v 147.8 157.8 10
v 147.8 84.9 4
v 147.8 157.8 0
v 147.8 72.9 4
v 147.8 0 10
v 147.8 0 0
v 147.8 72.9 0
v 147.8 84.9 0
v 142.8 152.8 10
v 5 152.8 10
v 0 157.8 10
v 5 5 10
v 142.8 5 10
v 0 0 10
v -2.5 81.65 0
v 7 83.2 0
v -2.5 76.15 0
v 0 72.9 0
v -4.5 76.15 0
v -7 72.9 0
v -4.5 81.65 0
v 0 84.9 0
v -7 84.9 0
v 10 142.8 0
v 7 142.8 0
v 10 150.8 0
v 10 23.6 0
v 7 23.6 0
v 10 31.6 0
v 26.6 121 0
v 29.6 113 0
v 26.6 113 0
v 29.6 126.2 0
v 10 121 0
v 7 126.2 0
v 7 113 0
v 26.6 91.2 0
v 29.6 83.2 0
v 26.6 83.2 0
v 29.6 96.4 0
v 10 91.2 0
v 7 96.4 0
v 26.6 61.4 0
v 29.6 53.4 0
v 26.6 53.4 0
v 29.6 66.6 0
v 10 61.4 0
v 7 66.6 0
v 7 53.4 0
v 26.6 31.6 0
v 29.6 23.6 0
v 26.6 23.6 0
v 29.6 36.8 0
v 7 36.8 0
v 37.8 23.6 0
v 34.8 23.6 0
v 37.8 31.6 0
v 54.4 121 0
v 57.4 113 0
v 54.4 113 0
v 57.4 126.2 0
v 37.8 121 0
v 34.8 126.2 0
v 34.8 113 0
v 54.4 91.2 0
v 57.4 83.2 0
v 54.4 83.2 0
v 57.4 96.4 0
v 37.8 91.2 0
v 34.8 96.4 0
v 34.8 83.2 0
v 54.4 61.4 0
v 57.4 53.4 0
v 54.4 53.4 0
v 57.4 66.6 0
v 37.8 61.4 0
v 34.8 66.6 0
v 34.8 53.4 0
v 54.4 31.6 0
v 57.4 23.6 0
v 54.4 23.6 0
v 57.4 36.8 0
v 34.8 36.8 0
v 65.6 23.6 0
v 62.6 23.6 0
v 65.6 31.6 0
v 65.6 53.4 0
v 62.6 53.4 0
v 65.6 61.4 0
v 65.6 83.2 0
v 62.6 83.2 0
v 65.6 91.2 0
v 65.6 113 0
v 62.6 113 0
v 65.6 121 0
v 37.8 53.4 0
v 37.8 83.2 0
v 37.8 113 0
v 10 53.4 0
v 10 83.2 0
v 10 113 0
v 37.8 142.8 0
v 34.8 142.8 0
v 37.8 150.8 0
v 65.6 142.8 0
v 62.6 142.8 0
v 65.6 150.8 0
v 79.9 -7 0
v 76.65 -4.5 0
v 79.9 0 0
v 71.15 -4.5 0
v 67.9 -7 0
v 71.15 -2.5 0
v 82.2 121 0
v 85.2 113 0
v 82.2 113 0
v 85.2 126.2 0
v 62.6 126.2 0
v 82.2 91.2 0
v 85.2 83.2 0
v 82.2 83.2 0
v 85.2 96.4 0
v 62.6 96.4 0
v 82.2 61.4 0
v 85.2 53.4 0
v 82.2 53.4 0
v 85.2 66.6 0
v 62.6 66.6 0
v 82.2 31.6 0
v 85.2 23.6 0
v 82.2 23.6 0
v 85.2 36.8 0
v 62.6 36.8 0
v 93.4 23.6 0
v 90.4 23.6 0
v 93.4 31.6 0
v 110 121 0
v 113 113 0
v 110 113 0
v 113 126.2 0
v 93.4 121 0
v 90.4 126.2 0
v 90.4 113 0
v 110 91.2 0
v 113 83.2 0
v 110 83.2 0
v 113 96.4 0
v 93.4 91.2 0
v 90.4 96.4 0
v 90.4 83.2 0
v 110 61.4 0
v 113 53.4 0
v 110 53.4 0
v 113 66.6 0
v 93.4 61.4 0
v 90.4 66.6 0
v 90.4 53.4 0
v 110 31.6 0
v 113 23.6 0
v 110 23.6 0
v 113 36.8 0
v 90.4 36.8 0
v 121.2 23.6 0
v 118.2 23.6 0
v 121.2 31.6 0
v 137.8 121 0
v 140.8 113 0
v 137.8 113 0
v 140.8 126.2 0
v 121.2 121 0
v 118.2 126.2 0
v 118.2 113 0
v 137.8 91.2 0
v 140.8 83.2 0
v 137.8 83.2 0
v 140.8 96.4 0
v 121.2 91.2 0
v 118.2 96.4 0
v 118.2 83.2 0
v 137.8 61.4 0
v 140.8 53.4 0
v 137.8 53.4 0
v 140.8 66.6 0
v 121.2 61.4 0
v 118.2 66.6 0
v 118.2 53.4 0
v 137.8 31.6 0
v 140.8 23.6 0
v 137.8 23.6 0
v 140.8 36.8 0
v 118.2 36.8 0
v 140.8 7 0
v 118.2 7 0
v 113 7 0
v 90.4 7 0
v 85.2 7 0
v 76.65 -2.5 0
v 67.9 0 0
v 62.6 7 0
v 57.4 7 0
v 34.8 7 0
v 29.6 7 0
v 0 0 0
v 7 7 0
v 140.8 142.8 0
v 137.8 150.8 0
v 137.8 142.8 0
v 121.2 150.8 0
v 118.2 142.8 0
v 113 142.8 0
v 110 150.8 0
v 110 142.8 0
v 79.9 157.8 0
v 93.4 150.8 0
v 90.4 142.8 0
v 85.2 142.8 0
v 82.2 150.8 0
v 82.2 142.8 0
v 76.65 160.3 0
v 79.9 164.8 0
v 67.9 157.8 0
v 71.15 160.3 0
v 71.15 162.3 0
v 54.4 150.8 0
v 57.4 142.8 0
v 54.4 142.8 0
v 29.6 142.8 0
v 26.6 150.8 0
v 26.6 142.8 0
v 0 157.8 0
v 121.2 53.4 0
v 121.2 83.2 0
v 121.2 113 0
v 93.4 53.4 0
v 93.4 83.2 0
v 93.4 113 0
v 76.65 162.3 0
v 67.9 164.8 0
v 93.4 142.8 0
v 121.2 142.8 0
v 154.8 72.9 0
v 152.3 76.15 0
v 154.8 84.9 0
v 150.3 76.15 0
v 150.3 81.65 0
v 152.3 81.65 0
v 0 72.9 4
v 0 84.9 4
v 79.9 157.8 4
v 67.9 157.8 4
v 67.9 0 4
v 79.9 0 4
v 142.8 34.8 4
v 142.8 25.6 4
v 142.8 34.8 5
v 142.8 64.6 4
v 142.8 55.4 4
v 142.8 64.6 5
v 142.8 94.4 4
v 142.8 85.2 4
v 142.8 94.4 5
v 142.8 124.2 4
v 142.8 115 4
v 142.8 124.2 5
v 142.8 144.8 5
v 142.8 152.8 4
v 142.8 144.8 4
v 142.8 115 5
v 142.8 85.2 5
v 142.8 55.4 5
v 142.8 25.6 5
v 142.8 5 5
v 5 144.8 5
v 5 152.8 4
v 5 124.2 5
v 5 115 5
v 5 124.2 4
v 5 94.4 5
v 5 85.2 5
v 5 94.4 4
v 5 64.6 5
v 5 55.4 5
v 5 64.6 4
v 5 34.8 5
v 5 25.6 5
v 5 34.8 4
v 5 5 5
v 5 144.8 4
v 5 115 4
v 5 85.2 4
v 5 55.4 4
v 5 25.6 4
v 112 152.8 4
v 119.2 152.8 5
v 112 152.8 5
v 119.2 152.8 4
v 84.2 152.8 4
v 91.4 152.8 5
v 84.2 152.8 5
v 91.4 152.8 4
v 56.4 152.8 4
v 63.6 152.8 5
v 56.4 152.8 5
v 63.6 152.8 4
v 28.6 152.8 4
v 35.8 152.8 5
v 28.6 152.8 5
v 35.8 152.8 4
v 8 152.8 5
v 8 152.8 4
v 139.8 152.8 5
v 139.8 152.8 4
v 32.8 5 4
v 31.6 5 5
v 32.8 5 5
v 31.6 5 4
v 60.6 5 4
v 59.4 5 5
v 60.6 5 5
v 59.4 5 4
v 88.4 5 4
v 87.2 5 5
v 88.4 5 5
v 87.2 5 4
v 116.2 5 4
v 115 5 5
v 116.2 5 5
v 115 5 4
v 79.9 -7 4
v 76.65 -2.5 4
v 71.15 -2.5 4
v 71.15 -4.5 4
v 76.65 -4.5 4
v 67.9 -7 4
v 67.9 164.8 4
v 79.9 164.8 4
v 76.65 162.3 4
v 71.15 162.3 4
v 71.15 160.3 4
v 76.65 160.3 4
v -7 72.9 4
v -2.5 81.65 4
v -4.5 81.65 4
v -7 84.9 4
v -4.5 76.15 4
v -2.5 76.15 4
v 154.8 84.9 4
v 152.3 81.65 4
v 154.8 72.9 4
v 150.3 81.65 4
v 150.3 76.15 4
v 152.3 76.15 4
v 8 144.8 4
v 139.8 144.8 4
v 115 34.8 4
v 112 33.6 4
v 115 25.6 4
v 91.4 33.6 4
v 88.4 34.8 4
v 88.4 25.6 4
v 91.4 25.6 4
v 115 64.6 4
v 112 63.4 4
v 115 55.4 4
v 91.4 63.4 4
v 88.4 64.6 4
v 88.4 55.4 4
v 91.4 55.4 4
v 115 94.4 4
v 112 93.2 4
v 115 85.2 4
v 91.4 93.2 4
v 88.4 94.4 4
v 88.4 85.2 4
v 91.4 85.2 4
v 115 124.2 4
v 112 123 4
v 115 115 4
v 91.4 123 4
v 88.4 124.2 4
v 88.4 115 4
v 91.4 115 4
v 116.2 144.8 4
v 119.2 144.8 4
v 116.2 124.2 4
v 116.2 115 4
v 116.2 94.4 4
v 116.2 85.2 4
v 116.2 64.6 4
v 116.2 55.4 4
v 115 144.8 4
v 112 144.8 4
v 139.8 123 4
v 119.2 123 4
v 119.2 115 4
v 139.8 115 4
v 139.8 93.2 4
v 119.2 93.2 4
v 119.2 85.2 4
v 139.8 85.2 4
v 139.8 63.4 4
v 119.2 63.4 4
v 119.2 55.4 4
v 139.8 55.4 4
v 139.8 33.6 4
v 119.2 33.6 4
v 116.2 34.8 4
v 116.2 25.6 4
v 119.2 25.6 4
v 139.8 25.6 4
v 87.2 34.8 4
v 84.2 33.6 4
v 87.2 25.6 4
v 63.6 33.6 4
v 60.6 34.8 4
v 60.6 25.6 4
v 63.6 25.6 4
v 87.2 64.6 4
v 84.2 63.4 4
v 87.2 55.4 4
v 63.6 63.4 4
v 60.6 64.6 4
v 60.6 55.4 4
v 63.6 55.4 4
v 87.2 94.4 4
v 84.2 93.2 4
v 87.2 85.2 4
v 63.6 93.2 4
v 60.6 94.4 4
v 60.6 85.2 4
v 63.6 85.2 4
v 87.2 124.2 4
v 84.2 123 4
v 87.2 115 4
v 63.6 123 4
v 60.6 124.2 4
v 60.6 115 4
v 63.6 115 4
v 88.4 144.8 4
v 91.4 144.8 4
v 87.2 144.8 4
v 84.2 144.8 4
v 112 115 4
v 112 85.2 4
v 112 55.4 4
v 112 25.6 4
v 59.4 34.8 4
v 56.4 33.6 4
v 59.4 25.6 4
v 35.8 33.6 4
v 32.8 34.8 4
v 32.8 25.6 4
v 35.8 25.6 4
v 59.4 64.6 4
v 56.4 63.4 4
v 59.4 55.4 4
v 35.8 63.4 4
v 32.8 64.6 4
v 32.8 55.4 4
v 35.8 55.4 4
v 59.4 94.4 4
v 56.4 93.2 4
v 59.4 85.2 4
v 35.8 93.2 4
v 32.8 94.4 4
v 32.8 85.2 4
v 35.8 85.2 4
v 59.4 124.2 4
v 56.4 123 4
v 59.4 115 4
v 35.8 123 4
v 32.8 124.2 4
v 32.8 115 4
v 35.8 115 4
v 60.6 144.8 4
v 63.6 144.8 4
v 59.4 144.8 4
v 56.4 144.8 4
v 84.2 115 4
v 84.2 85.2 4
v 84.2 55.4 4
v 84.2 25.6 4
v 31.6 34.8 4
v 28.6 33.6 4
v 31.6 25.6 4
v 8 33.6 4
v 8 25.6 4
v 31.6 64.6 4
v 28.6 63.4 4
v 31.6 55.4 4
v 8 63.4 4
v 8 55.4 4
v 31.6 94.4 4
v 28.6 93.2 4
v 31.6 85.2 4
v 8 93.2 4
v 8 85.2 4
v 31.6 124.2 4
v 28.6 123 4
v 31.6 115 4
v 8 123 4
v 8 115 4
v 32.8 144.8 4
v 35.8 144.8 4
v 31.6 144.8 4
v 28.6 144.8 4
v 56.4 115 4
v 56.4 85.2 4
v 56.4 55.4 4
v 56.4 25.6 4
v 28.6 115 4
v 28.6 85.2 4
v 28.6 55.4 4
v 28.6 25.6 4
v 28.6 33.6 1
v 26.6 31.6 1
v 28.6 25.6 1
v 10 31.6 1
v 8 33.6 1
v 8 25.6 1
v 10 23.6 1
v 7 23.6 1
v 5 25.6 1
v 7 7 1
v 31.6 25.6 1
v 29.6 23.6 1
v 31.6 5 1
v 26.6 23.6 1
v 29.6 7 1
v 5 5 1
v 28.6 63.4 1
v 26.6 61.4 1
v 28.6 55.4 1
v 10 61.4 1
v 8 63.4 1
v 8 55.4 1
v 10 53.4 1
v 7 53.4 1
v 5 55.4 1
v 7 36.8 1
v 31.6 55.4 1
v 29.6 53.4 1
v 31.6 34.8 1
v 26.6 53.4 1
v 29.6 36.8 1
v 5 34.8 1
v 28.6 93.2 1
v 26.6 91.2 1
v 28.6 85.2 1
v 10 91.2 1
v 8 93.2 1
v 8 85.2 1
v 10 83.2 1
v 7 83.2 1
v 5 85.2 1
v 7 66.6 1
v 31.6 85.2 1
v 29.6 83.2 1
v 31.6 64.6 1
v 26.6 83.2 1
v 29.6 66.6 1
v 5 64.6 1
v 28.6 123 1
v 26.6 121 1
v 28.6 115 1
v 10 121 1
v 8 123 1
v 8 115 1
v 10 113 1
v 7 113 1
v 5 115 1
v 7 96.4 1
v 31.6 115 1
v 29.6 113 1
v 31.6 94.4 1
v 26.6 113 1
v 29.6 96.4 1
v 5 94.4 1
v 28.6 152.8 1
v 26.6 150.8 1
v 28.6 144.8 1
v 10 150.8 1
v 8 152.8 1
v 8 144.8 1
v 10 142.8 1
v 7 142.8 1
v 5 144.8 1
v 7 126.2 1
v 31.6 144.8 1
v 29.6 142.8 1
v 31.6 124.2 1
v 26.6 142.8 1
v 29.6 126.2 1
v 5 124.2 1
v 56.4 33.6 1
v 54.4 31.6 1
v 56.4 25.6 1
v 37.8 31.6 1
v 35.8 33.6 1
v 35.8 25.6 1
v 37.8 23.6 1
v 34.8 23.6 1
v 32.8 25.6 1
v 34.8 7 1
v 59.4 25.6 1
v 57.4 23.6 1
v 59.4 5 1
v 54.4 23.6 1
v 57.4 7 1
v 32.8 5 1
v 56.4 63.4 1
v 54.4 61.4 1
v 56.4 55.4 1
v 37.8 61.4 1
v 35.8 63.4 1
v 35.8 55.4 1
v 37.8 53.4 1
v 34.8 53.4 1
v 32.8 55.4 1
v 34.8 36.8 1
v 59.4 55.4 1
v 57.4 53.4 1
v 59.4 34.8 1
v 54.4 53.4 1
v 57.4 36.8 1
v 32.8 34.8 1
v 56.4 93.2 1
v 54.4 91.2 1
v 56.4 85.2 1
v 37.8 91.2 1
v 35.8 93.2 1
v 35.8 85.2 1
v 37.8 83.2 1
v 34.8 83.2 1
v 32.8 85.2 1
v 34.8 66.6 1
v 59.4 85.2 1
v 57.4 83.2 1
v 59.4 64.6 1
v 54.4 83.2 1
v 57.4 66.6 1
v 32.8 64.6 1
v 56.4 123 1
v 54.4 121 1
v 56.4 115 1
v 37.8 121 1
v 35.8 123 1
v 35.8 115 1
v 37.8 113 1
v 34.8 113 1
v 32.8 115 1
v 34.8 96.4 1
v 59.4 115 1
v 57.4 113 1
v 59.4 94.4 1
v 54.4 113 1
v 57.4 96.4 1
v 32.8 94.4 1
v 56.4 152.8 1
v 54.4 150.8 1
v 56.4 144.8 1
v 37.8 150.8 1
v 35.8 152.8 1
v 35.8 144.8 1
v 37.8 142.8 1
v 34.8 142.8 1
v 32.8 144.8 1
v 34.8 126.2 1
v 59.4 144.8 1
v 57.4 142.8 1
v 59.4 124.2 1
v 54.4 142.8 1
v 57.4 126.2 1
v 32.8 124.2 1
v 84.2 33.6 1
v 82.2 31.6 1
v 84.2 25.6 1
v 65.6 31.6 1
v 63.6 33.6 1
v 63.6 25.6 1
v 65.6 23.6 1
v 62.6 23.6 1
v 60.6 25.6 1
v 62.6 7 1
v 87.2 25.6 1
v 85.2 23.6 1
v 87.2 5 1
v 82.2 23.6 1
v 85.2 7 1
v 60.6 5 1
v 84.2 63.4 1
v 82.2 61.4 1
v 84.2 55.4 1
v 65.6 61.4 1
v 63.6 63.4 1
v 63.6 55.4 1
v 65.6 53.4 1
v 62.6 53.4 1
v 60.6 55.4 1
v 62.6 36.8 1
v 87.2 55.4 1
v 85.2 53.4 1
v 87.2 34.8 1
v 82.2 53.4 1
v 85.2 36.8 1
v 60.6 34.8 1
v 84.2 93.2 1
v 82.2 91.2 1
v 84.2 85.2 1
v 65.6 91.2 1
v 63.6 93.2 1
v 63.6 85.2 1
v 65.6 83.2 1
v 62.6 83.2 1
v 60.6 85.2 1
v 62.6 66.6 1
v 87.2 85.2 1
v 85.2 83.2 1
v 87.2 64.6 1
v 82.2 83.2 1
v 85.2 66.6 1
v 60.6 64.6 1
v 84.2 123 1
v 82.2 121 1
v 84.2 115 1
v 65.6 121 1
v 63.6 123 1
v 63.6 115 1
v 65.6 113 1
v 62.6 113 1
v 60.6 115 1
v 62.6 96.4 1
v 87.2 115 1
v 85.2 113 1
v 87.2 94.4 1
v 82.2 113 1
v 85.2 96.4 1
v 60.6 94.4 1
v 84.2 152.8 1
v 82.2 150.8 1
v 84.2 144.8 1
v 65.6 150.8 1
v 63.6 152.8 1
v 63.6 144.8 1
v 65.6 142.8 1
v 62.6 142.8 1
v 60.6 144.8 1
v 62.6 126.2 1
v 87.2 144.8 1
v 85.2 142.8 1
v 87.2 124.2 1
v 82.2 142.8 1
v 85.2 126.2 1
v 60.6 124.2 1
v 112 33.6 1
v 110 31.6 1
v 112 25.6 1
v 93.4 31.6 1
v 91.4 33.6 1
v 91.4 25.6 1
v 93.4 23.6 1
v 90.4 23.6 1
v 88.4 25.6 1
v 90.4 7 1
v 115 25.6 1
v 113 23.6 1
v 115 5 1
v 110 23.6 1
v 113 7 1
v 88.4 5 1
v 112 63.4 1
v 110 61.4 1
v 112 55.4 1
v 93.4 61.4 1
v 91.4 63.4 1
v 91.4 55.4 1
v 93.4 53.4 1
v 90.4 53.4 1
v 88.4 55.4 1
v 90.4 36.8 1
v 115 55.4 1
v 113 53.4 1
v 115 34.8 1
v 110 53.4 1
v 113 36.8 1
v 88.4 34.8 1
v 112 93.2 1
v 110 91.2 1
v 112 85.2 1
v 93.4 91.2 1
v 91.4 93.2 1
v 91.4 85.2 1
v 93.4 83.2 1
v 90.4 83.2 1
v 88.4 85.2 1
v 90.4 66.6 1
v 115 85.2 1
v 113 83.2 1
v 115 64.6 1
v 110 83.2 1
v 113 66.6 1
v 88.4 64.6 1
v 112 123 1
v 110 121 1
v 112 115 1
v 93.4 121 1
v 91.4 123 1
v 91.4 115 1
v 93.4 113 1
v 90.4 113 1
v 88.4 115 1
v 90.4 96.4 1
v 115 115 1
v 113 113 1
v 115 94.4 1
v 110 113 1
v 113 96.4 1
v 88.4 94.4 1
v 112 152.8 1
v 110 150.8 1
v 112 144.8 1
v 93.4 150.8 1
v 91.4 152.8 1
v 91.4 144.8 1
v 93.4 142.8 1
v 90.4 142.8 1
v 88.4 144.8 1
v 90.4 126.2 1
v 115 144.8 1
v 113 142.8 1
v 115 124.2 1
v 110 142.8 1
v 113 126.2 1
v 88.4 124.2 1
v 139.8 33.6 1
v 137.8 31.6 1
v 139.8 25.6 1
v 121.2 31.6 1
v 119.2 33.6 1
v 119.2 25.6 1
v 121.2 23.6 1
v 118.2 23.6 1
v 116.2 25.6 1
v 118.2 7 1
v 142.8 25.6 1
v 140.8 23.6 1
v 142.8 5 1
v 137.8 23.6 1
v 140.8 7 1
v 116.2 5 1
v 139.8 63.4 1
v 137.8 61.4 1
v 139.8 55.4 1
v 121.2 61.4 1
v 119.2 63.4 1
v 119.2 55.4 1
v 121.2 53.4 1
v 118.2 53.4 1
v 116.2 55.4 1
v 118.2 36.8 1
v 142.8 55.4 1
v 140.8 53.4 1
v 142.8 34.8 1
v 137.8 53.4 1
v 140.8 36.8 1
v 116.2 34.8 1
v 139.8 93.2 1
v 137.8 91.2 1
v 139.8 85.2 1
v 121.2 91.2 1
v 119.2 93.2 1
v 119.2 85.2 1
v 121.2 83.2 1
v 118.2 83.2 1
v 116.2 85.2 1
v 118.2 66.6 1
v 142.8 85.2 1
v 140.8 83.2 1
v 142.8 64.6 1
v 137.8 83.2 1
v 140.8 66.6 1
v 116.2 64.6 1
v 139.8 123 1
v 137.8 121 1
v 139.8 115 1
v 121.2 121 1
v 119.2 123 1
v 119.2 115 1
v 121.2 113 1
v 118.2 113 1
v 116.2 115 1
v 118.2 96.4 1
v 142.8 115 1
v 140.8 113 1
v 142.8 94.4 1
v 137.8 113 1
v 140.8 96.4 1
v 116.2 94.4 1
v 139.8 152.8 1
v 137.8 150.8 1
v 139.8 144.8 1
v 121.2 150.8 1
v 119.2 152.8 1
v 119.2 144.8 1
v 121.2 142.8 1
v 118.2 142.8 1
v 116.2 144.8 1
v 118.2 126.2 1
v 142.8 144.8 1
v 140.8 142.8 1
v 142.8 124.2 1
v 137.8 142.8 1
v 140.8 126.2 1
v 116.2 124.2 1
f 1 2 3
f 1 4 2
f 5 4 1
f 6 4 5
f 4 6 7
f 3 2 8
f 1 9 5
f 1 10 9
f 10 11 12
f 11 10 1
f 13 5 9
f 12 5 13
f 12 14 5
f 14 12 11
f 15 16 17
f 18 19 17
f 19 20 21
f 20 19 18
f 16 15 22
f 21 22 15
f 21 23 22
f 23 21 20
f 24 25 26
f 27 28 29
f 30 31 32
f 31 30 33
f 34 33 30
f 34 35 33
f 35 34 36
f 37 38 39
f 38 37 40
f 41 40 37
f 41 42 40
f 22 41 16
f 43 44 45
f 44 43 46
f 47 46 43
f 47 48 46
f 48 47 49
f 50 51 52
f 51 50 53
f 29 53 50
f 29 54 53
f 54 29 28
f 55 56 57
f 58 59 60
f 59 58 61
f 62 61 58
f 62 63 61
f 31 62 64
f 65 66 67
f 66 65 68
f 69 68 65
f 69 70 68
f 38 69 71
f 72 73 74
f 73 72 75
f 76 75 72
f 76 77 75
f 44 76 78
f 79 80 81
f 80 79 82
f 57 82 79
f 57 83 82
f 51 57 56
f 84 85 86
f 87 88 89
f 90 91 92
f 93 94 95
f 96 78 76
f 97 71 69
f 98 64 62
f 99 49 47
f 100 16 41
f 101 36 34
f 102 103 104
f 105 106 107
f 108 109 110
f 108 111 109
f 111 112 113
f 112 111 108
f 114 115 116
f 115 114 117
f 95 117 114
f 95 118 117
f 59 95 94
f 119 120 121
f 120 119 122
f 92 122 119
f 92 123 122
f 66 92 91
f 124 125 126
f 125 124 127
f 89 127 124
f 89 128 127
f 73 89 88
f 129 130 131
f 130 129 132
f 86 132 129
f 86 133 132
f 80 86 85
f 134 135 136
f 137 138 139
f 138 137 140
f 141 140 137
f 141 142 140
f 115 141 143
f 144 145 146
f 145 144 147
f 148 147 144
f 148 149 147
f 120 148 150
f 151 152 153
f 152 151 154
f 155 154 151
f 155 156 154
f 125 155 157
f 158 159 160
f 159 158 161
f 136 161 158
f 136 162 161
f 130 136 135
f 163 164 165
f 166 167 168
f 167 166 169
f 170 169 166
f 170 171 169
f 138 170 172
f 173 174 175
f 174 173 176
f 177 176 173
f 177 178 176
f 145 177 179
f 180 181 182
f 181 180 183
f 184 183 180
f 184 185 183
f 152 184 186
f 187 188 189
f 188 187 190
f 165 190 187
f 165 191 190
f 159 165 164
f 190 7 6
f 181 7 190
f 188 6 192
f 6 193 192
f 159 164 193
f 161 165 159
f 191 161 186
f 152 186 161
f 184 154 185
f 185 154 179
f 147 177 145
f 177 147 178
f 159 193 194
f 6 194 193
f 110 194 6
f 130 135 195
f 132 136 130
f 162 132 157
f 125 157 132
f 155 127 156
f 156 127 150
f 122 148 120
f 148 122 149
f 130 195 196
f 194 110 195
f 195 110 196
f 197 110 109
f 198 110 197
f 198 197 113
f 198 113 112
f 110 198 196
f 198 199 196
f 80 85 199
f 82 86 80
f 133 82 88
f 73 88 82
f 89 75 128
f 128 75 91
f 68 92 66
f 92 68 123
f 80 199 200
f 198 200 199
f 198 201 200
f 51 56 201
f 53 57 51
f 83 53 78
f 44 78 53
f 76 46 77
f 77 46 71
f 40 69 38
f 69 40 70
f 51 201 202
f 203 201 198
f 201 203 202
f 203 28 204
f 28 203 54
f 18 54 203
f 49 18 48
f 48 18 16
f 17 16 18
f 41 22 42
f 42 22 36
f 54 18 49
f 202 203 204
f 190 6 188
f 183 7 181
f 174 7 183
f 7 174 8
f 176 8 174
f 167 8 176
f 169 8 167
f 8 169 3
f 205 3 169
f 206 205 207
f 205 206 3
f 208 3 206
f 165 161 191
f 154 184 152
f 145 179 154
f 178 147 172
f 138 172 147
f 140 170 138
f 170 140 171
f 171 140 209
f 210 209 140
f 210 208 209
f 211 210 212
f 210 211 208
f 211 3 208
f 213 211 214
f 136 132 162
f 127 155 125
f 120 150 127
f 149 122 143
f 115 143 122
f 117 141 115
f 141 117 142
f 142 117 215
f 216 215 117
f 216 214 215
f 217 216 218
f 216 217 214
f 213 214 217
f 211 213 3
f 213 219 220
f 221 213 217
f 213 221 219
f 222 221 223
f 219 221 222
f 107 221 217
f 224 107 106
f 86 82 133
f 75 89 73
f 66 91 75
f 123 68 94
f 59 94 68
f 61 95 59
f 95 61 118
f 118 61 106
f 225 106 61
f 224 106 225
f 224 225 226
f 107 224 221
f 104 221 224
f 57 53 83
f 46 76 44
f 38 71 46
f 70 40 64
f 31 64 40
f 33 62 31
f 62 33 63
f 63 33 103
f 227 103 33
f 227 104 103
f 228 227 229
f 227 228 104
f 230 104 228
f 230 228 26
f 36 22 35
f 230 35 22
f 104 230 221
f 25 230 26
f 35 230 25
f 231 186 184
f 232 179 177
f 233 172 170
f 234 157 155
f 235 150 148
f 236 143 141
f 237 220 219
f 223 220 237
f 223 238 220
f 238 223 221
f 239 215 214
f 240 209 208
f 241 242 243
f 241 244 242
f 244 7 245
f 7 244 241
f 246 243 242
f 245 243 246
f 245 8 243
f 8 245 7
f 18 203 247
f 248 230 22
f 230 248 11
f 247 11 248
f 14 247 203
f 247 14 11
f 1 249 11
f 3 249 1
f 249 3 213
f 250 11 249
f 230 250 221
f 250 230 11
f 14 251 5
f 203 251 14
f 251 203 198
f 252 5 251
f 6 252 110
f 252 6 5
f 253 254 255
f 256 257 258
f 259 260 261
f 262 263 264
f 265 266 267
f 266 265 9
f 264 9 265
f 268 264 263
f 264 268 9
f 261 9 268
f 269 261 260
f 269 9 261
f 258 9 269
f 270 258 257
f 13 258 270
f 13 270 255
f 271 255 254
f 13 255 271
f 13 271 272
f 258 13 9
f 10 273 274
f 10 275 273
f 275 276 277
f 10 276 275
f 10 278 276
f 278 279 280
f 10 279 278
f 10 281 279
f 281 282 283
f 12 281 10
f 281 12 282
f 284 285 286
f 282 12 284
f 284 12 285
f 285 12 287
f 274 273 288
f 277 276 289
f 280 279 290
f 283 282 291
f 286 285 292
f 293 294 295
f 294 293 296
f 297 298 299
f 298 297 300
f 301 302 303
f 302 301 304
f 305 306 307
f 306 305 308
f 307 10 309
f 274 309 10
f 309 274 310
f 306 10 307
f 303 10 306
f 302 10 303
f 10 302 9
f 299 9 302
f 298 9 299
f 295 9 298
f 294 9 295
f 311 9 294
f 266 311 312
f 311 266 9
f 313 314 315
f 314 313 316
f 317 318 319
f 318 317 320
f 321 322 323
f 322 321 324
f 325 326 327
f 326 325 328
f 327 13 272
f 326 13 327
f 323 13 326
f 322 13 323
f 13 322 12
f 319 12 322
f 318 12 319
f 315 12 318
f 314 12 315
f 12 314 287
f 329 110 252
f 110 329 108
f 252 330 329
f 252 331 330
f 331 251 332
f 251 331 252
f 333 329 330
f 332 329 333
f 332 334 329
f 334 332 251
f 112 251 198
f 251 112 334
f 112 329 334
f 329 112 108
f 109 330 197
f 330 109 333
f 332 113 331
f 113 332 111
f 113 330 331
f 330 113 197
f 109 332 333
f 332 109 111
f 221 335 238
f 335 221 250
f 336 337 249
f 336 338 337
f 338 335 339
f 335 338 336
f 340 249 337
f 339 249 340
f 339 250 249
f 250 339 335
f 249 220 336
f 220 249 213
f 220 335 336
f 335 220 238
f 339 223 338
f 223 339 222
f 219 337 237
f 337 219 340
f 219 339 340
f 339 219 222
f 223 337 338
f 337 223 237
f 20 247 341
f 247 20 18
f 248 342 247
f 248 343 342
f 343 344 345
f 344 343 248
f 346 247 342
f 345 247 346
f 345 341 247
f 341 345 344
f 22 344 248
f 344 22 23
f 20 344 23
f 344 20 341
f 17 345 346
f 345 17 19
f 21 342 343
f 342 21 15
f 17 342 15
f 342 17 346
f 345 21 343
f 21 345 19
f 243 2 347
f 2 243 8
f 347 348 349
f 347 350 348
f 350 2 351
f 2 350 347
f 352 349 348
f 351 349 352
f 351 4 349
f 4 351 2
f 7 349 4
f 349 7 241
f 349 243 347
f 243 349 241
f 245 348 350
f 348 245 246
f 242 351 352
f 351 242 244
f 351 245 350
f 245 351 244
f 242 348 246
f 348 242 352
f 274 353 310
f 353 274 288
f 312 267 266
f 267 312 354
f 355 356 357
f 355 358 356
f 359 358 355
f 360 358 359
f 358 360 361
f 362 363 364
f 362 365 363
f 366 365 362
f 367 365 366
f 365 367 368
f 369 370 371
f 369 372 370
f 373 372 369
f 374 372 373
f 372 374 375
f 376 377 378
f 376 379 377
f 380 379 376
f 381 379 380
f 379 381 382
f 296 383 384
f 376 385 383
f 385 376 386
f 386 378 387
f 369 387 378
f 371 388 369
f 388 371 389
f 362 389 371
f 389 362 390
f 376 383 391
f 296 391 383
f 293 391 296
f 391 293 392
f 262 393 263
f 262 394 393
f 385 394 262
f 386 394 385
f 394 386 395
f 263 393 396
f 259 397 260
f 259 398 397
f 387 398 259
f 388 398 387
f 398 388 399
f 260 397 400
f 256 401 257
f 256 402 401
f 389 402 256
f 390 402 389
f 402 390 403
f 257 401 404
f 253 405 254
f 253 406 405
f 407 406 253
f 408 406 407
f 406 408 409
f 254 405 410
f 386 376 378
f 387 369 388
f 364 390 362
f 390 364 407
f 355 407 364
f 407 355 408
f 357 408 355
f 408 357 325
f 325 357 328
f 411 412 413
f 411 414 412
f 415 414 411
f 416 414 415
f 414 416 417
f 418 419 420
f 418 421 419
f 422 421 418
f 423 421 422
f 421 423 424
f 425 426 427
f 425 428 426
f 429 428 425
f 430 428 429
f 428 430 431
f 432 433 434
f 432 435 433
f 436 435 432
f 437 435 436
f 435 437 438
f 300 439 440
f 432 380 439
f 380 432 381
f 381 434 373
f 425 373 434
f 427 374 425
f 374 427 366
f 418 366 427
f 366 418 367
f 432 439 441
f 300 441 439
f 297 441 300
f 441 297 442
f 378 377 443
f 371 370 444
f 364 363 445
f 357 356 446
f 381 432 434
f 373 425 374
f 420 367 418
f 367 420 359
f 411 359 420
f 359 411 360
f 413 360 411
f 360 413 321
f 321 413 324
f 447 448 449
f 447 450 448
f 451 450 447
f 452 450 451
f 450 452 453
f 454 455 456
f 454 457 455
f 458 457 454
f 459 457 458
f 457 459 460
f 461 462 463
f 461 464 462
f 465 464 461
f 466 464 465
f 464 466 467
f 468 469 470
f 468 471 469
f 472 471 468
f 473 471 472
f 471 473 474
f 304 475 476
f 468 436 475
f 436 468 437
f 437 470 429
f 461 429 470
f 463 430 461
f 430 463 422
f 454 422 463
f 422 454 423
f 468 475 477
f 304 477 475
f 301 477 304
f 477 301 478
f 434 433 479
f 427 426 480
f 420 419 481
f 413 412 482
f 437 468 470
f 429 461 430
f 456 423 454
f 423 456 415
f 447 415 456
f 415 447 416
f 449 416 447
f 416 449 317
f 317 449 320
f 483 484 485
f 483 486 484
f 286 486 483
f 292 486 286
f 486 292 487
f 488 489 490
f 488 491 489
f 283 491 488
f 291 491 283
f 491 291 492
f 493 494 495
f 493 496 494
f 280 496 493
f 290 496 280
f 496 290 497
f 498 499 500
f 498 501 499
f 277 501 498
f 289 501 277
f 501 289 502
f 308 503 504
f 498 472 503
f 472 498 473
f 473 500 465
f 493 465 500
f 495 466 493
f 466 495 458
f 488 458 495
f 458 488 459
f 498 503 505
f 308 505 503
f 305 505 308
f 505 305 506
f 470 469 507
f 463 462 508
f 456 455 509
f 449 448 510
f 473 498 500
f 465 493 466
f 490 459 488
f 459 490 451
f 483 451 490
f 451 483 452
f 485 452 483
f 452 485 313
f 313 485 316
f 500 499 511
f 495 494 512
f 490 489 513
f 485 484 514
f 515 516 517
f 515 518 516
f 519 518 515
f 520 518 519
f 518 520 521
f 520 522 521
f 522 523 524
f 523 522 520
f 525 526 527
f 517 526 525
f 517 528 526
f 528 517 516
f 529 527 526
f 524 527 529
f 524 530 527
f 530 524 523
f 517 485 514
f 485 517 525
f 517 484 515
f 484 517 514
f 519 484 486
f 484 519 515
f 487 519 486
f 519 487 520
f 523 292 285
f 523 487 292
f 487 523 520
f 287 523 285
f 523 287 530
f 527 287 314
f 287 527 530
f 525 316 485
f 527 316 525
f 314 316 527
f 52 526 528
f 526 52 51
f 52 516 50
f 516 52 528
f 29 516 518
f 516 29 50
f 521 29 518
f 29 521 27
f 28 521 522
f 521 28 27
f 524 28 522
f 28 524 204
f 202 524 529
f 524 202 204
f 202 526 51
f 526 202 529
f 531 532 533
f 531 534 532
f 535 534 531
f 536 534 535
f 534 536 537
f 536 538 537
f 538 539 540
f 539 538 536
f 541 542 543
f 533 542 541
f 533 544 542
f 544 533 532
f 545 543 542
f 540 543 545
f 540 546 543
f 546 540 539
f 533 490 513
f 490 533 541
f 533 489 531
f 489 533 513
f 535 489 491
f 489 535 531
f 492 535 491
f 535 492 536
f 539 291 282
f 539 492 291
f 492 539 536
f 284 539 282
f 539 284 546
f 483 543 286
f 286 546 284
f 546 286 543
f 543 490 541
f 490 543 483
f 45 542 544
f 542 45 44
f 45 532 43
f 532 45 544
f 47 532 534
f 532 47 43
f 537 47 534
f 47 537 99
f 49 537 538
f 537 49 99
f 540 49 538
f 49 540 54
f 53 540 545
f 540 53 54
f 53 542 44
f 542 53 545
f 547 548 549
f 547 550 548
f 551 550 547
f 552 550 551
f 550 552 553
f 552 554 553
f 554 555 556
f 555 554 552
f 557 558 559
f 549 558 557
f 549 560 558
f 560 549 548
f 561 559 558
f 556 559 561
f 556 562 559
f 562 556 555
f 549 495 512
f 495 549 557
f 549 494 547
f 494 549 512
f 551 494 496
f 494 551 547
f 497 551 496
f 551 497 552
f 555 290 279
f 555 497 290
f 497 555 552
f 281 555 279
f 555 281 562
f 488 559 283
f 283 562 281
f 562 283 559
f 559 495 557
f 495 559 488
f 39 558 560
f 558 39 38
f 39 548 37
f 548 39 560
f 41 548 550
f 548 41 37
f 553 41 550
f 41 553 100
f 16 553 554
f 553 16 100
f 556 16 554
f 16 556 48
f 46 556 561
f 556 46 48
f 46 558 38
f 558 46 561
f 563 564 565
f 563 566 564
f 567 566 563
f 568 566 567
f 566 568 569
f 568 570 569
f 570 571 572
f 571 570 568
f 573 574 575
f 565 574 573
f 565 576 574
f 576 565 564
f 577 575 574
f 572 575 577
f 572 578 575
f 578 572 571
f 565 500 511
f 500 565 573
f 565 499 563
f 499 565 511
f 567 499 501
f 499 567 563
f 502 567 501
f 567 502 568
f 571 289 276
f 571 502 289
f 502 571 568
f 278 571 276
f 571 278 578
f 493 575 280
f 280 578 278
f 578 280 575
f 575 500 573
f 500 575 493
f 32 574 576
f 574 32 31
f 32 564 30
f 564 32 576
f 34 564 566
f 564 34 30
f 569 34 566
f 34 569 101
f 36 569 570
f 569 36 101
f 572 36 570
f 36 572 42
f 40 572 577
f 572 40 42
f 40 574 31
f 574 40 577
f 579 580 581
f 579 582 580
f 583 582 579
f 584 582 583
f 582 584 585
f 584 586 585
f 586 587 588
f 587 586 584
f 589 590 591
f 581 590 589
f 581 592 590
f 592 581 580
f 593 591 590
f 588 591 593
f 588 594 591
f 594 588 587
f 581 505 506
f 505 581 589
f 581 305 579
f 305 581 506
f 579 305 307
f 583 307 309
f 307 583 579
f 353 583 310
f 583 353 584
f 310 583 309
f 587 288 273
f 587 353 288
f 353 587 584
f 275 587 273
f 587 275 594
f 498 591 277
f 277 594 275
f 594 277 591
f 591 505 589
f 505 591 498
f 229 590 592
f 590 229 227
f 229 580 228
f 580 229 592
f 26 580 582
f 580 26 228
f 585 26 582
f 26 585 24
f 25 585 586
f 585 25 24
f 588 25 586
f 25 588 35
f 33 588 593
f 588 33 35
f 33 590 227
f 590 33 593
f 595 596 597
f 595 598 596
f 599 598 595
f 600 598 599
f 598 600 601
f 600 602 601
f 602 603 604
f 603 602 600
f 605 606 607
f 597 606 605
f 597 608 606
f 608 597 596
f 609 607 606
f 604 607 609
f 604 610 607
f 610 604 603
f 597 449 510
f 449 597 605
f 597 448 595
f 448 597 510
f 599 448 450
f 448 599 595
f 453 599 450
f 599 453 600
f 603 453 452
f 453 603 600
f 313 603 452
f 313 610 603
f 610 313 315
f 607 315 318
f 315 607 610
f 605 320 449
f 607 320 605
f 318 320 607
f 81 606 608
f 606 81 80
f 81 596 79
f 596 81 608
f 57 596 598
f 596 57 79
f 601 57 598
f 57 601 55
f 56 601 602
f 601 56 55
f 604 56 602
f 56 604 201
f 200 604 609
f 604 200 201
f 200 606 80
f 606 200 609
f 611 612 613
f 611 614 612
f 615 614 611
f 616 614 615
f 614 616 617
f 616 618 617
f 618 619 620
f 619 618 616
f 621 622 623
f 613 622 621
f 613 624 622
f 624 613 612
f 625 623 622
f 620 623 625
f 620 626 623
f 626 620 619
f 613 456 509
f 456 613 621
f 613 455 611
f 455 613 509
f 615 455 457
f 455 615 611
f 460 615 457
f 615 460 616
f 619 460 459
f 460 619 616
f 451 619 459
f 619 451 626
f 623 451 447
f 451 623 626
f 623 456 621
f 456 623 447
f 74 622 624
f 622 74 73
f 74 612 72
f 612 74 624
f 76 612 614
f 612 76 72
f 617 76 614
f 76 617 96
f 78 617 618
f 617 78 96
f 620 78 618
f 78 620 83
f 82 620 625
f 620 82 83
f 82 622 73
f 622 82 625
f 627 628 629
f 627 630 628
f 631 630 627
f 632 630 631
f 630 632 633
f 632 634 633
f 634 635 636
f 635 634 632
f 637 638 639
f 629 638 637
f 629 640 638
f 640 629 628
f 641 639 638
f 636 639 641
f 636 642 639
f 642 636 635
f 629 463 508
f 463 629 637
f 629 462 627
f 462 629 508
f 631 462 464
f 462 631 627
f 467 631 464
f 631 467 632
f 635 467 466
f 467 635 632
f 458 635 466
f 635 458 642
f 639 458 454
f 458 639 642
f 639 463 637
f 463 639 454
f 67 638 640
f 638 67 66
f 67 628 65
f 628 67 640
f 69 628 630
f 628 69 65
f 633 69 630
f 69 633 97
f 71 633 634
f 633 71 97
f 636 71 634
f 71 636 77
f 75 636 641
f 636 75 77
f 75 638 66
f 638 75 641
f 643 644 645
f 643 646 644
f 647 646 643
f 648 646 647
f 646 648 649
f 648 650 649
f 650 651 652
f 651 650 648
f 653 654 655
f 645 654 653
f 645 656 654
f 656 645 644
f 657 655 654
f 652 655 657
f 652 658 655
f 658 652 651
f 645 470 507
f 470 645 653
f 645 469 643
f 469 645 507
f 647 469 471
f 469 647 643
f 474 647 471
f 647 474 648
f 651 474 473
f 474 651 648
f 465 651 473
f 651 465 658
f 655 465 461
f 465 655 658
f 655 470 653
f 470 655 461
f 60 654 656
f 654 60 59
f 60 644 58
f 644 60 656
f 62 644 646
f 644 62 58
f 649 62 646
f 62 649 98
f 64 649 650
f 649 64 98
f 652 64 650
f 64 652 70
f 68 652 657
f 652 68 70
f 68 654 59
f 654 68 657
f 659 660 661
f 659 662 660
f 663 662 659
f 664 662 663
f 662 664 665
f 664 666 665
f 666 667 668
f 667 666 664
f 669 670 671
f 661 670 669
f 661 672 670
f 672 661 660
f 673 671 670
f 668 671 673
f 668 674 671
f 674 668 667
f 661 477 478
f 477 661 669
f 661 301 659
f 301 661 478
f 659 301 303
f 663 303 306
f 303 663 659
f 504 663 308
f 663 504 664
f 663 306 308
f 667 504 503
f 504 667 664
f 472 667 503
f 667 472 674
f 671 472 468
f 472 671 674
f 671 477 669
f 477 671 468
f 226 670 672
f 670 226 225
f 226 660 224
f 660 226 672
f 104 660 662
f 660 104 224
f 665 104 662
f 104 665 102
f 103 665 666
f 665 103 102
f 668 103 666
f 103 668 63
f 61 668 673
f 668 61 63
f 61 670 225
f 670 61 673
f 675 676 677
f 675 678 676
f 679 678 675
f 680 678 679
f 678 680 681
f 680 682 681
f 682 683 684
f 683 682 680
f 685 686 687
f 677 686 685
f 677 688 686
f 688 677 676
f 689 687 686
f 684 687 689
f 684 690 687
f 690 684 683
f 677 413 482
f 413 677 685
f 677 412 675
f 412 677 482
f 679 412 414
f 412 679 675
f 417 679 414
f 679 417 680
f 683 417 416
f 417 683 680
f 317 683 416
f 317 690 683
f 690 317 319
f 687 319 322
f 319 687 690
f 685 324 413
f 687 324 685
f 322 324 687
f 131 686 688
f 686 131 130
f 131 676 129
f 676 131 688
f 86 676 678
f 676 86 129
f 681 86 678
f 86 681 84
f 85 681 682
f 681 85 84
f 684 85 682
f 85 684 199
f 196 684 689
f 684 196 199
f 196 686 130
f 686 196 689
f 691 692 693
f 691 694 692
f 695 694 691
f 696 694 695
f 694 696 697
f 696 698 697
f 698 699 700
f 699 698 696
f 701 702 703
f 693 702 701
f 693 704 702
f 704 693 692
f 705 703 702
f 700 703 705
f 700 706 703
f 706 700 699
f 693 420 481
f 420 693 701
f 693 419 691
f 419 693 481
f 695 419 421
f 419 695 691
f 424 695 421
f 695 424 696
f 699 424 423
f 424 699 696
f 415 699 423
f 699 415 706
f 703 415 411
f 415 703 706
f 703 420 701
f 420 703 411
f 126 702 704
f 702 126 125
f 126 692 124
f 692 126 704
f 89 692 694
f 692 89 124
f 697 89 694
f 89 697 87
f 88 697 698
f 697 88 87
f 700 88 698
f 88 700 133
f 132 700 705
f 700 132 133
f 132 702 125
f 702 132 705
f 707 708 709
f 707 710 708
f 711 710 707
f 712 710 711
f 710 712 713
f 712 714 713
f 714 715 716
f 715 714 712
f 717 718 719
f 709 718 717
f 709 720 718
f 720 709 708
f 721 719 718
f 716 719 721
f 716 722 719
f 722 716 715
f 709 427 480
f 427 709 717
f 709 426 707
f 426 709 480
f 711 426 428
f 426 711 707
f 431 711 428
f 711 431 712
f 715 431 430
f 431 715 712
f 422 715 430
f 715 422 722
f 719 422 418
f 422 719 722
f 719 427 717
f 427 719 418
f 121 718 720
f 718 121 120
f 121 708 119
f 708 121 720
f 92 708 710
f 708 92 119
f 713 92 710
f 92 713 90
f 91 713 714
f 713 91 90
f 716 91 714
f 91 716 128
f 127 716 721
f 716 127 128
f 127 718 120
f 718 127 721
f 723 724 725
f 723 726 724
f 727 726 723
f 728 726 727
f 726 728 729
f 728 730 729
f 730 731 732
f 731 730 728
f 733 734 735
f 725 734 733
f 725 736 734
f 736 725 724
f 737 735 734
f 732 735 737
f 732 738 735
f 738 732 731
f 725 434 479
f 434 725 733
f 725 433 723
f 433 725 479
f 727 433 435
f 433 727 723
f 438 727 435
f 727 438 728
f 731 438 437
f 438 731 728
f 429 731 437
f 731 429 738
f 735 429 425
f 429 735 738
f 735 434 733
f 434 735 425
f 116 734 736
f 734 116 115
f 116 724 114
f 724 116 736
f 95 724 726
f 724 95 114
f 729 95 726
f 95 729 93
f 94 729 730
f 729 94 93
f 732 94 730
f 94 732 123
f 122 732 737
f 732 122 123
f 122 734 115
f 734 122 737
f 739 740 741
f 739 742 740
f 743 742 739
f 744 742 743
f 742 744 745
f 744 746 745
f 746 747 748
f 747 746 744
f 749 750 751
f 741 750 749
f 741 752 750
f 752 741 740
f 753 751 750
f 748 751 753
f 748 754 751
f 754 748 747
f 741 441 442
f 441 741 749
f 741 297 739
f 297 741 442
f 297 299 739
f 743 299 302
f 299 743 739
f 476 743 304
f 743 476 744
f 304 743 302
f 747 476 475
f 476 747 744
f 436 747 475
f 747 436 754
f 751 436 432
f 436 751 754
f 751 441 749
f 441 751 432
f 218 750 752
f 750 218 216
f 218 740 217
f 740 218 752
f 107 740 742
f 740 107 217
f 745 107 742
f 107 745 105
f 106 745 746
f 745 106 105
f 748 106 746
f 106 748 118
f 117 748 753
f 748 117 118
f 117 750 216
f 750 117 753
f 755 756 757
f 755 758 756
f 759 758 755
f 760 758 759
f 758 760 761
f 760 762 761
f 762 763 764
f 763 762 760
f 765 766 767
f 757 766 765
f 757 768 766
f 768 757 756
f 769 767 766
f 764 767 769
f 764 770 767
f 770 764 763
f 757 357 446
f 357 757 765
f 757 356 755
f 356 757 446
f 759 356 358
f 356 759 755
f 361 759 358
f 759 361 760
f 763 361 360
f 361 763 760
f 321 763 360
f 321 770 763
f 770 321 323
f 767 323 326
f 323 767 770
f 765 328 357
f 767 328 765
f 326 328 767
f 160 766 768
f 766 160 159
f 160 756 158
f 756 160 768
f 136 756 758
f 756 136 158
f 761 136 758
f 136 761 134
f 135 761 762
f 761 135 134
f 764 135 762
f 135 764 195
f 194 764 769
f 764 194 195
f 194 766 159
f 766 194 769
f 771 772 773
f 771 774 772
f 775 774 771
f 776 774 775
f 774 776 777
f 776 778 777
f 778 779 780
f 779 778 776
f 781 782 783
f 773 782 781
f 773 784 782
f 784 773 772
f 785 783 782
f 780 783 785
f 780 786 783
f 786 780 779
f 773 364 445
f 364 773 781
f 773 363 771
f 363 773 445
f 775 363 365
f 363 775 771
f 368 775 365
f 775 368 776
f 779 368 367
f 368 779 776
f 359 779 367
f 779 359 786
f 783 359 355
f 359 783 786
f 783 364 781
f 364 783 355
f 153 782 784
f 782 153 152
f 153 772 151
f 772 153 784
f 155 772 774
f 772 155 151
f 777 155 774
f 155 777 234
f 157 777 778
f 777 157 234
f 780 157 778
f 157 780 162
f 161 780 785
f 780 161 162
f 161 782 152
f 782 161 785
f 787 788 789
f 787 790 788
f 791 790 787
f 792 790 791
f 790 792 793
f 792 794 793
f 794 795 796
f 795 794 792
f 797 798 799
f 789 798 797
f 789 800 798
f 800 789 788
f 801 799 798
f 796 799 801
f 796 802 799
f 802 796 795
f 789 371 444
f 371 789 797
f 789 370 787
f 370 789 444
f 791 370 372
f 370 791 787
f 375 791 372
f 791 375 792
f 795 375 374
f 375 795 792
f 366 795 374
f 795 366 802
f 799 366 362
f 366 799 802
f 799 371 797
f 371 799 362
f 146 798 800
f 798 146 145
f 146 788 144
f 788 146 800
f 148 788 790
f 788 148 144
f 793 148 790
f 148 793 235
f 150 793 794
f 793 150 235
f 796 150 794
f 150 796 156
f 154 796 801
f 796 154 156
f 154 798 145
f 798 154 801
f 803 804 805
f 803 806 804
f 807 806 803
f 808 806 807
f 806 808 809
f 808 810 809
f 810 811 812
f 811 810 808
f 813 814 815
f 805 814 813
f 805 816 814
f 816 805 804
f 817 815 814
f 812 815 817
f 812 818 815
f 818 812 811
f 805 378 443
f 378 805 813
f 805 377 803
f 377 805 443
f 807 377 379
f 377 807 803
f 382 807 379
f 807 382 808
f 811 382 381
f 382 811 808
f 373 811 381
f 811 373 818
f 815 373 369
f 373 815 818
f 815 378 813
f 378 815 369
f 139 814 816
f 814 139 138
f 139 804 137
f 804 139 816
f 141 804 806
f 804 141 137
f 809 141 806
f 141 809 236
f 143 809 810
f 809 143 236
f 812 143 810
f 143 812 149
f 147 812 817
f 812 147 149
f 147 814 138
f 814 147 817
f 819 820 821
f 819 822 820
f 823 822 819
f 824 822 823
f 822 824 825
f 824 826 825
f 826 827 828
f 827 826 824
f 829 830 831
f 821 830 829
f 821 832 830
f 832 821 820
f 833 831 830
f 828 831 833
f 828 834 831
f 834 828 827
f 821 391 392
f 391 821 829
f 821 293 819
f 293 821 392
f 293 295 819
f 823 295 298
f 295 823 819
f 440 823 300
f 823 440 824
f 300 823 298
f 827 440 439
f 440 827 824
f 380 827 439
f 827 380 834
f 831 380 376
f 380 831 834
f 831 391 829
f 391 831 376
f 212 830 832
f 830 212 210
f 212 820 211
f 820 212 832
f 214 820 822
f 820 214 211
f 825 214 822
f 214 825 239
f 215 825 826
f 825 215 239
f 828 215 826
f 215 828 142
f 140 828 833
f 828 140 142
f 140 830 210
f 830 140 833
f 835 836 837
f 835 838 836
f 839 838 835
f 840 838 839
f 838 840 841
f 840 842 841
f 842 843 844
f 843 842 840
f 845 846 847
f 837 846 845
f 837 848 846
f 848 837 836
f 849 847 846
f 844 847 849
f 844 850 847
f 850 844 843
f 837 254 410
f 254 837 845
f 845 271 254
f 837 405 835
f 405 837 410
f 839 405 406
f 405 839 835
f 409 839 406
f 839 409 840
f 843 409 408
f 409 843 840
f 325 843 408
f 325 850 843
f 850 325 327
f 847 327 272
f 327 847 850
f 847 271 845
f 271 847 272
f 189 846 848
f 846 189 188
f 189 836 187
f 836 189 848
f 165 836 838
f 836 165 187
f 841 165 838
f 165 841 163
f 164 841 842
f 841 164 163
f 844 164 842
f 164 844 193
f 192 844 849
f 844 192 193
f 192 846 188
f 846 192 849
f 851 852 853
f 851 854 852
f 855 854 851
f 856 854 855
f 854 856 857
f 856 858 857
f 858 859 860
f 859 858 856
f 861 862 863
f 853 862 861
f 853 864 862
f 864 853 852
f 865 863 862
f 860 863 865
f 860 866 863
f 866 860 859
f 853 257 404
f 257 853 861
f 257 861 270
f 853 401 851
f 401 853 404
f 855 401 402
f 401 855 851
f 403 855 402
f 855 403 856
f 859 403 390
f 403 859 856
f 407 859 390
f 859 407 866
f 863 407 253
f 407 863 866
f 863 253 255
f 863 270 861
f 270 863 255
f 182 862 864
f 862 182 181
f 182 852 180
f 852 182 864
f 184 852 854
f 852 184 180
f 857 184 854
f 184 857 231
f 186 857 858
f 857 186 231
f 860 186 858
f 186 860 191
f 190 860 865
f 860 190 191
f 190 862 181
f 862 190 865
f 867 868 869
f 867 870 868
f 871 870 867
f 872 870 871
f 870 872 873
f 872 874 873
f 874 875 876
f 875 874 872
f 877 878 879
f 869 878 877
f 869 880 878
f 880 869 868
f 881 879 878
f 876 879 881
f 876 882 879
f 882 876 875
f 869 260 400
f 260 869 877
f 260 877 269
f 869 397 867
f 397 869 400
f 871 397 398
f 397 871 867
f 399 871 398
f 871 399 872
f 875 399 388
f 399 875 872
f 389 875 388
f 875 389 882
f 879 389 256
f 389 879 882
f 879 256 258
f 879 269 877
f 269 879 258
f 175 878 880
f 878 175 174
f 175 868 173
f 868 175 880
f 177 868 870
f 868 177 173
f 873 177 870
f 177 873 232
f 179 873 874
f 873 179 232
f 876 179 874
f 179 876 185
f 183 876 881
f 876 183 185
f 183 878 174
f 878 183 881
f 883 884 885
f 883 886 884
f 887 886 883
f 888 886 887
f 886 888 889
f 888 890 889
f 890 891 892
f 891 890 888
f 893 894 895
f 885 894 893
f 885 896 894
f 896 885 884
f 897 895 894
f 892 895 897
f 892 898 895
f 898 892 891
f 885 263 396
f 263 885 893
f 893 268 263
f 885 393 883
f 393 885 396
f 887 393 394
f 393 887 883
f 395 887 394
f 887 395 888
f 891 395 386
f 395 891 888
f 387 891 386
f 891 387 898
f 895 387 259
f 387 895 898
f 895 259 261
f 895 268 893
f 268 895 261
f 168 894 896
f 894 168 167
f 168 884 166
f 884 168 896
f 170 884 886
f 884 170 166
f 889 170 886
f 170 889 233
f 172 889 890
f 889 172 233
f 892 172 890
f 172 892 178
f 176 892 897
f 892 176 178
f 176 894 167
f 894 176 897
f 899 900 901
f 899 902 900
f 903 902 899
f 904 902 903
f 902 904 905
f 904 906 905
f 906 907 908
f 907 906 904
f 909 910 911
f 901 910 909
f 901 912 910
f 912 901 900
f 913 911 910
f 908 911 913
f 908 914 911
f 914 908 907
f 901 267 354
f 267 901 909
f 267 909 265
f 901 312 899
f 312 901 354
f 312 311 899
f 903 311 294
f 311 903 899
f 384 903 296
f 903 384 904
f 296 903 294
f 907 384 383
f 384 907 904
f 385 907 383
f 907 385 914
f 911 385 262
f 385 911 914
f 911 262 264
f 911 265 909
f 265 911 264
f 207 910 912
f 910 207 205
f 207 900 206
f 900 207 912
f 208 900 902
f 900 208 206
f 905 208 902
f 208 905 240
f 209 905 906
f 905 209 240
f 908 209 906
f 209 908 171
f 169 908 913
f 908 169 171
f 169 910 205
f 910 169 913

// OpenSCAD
// Shipping tray for cased One ROMs. Use make-tray.sh, or set these here.
count = 25;
cols = 0;           // 0 chooses the grid
rows = 0;
part = "base";      // "base" or "top"
bed = [250, 210];   // Original Prusa MK3

// Width, length, and width and length of the narrow end
cap = [26, 28, 20, 8];      // ../cases/cap-with-header-pins.stl
case_end = [23, 25, 17, 8]; // ../cases/case-*-with-header-pins.stl

clearance = 0.3;
wall = 1.2;
border = 5;
rim_h = 10;
floor_t = 1;
depth = 3;
lip = 2;
tab = [12, 7];      // along the edge, out from the edge
slot = [5.5, 2];

pitch = [cap[0], cap[1]] + [1, 1] * (2 * clearance + wall);
height = floor_t + depth;

function size(c, r) = [c * pitch.x, r * pitch.y] + [1, 1] * (2 * border - wall);
function fits(c, r) = let(s = size(c, r)) s.x + 2 * tab.y <= bed.x && s.y + 2 * tab.y <= bed.y;

// Fewest pockets, then the squarest grid, at most 3 times longer than wide
function better(a, b) = b == undef || a[0] < b[0] || (a[0] == b[0] && a[1] - a[2] < b[1] - b[2]);
function pick(l, i = 0, b = undef) = i == len(l) ? b : pick(l, i + 1, better(l[i], b) ? l[i] : b);
choices = [for (r = [1:count]) let(c = ceil(count / r)) if (c >= r && c <= 3 * r && fits(c, r)) [c * r, c, r]];
auto = pick(choices);

assert(cols > 0 || auto != undef, str(count, " units don't fit on one plate"));
c = cols > 0 ? cols : auto[1];
r = rows > 0 ? rows : auto[2];
assert(c * r >= count, str(c, "x", r, " holds fewer than ", count, " units"));
assert(fits(c, r), str(c, "x", r, " doesn't fit the bed"));
echo(grid = str(c, "x", r));

s = size(c, r);
shape = part == "base" ? cap : case_end;

module tabs() {
    for (p = [[s.x / 2, -tab.y / 2, 0], [s.x / 2, s.y + tab.y / 2, 180],
              [-tab.y / 2, s.y / 2, -90], [s.x + tab.y / 2, s.y / 2, 90]])
        translate([p[0], p[1]]) rotate(p[2]) difference() {
            translate([-tab.x / 2, -tab.y / 2]) cube([tab.x, tab.y + 1, height]);
            translate([-slot.x / 2, -slot.y / 2, -1]) cube([slot.x, slot.y, height + 2]);
        }
}

module at_pockets() {
    for (i = [0:c - 1], j = [0:r - 1])
        translate([border + i * pitch.x + pitch.x / 2 - wall / 2,
                   border + j * pitch.y + pitch.y / 2 - wall / 2]) children();
}

module outline() {
    translate([-shape[0] / 2, -shape[1] / 2]) square([shape[0], shape[1] - shape[3]]);
    translate([-shape[2] / 2, shape[1] / 2 - shape[3]]) square([shape[2], shape[3]]);
}

difference() {
    union() {
        cube([s.x, s.y, height]);
        difference() {
            cube([s.x, s.y, rim_h]);
            translate([border, border, -1]) cube([s.x - 2 * border, s.y - 2 * border, rim_h + 2]);
        }
        tabs();
    }
    at_pockets() {
        translate([0, 0, floor_t]) linear_extrude(depth + 1) offset(delta = clearance) outline();
        translate([0, 0, -1]) linear_extrude(height + 2) offset(delta = clearance - lip) outline();
    }
}
